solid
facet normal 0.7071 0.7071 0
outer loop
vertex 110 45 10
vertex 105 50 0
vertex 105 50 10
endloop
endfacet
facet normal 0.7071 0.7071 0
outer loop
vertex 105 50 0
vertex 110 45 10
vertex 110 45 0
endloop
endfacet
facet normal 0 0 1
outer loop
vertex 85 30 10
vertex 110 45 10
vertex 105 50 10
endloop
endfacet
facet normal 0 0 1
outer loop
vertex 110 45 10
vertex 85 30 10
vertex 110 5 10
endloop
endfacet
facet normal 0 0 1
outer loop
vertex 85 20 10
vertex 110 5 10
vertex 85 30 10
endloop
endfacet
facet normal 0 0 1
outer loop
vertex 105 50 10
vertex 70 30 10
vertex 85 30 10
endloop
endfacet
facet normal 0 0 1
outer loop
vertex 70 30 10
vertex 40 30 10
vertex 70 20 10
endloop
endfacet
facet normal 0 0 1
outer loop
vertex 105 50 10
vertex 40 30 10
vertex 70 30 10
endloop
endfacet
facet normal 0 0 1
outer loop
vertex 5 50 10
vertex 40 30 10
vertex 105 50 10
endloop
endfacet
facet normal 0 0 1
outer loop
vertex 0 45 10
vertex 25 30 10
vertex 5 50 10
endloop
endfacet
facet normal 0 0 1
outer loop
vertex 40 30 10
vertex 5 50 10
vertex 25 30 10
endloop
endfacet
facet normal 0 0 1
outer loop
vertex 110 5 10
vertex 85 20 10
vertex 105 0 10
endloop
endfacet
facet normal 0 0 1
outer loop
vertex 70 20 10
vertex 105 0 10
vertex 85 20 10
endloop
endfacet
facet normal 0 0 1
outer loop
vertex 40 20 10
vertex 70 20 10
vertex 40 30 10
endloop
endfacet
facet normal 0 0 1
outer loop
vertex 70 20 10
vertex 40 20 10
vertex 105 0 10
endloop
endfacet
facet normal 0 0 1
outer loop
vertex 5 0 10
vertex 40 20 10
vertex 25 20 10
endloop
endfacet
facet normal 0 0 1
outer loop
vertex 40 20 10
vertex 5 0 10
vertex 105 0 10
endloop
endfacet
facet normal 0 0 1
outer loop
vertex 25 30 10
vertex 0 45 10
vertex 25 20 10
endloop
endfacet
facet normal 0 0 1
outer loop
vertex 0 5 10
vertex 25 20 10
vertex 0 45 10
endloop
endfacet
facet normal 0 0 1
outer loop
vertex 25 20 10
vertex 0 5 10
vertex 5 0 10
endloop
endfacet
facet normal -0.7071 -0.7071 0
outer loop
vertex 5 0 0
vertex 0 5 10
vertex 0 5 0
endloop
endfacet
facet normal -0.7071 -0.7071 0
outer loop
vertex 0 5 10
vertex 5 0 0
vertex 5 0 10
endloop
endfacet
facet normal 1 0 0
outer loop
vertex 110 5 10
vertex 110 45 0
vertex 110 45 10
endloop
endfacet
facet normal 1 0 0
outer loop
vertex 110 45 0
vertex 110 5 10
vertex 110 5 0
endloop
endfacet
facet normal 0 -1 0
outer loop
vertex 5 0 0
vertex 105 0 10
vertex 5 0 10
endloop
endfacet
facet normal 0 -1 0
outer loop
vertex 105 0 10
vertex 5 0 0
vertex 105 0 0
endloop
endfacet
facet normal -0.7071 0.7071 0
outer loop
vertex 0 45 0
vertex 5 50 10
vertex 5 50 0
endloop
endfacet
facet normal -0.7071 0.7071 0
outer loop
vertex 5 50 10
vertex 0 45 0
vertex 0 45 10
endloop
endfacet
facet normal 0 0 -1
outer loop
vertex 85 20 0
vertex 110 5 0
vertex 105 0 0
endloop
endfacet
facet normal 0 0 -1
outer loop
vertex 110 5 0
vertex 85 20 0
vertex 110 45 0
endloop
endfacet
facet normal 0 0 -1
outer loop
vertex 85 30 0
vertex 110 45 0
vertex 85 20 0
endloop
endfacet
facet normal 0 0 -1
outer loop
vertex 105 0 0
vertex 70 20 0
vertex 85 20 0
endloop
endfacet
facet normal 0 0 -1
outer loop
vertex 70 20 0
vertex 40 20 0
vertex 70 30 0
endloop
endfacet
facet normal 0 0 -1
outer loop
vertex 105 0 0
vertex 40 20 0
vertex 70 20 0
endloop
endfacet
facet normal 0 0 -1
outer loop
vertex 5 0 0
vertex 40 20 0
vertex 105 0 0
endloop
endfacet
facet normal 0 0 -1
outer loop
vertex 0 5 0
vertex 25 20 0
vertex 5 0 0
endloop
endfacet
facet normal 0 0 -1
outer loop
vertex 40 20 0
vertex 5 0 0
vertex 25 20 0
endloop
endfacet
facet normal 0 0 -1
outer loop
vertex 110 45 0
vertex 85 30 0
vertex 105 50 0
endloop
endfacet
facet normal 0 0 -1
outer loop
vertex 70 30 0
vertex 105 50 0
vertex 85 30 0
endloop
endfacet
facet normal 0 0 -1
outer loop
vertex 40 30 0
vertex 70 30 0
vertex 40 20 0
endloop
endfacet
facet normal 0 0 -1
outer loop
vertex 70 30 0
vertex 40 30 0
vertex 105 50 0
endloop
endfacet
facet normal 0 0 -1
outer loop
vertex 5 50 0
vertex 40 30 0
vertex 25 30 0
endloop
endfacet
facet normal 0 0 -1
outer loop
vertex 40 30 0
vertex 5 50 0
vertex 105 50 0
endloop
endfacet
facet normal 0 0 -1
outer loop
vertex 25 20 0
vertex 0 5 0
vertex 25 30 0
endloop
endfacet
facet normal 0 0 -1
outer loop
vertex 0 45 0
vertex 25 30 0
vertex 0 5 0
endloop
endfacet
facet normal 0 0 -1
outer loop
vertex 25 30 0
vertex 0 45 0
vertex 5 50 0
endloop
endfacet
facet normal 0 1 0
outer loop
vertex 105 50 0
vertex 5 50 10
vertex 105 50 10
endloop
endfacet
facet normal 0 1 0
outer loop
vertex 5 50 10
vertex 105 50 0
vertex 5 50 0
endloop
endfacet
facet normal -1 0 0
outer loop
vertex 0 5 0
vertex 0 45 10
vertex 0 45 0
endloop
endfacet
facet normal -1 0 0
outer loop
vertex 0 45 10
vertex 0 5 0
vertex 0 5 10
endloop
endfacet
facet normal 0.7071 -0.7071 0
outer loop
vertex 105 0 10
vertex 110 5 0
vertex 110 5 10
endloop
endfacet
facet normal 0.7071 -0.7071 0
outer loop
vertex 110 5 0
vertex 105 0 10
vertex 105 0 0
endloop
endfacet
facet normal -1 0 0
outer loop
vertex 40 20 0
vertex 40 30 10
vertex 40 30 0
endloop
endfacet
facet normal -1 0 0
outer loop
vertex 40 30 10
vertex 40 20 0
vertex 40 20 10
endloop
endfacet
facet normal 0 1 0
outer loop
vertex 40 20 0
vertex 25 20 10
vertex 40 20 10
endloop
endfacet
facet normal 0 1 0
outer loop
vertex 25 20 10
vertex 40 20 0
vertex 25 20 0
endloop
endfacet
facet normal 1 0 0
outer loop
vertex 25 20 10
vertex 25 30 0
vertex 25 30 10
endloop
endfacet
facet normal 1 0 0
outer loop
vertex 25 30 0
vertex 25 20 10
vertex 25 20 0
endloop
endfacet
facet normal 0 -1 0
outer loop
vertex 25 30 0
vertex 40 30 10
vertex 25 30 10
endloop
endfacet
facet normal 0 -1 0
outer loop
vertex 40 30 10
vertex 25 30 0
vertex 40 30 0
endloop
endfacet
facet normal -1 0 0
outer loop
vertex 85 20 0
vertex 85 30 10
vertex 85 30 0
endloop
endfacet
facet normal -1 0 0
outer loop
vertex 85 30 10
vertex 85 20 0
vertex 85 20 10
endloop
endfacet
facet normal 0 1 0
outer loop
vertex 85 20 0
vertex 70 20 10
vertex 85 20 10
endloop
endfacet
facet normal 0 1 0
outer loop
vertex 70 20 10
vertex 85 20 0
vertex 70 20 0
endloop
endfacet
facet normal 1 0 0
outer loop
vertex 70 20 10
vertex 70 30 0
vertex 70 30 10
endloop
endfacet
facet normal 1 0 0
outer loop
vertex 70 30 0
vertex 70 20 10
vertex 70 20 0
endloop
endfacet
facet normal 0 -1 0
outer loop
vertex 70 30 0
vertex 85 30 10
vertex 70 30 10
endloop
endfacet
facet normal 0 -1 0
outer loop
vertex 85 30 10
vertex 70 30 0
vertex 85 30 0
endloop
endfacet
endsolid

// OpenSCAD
$fn = 32;

// ----------------------------------------------------------------------
// Windowed plate: 2 voids, 110 x 50 x 10 mm
// ----------------------------------------------------------------------

// --- parameters (mm) ---
plate_l = 110;            // plate length, X
plate_w = 50;             // plate width, Y
plate_t = 10;             // plate thickness, Z
edge_margin = 10;         // wall from the plate edge to any window
windows = 2;              // number of windows in the row
win_l = 15;               // window length
win_w = 10;               // window width
win_pitch = 45;           // window pitch along X
depth_1 = 10;             // depth of void 1 (full thickness = through)
depth_2 = 10;             // depth of void 2 (full thickness = through)
corner_c = 5;             // corner chamfer of the plate

profile = [[5, 0], [105, 0], [110, 5], [110, 45], [105, 50], [5, 50], [0, 45], [0, 5]];  // primary outline, 8 points, counter clockwise
void_1 = [[25, 20], [40, 20], [40, 30], [25, 30]];  // window 1 of the row, 4 points
void_2 = [[70, 20], [85, 20], [85, 30], [70, 30]];  // window 2 of the row, 4 points

// --- the one profile operation ---
difference() {
  linear_extrude(height = plate_t) polygon(points = profile);
  translate([0, 0, -1])
    linear_extrude(height = plate_t + 2) polygon(points = void_1);
  translate([0, 0, -1])
    linear_extrude(height = plate_t + 2) polygon(points = void_2);
}
